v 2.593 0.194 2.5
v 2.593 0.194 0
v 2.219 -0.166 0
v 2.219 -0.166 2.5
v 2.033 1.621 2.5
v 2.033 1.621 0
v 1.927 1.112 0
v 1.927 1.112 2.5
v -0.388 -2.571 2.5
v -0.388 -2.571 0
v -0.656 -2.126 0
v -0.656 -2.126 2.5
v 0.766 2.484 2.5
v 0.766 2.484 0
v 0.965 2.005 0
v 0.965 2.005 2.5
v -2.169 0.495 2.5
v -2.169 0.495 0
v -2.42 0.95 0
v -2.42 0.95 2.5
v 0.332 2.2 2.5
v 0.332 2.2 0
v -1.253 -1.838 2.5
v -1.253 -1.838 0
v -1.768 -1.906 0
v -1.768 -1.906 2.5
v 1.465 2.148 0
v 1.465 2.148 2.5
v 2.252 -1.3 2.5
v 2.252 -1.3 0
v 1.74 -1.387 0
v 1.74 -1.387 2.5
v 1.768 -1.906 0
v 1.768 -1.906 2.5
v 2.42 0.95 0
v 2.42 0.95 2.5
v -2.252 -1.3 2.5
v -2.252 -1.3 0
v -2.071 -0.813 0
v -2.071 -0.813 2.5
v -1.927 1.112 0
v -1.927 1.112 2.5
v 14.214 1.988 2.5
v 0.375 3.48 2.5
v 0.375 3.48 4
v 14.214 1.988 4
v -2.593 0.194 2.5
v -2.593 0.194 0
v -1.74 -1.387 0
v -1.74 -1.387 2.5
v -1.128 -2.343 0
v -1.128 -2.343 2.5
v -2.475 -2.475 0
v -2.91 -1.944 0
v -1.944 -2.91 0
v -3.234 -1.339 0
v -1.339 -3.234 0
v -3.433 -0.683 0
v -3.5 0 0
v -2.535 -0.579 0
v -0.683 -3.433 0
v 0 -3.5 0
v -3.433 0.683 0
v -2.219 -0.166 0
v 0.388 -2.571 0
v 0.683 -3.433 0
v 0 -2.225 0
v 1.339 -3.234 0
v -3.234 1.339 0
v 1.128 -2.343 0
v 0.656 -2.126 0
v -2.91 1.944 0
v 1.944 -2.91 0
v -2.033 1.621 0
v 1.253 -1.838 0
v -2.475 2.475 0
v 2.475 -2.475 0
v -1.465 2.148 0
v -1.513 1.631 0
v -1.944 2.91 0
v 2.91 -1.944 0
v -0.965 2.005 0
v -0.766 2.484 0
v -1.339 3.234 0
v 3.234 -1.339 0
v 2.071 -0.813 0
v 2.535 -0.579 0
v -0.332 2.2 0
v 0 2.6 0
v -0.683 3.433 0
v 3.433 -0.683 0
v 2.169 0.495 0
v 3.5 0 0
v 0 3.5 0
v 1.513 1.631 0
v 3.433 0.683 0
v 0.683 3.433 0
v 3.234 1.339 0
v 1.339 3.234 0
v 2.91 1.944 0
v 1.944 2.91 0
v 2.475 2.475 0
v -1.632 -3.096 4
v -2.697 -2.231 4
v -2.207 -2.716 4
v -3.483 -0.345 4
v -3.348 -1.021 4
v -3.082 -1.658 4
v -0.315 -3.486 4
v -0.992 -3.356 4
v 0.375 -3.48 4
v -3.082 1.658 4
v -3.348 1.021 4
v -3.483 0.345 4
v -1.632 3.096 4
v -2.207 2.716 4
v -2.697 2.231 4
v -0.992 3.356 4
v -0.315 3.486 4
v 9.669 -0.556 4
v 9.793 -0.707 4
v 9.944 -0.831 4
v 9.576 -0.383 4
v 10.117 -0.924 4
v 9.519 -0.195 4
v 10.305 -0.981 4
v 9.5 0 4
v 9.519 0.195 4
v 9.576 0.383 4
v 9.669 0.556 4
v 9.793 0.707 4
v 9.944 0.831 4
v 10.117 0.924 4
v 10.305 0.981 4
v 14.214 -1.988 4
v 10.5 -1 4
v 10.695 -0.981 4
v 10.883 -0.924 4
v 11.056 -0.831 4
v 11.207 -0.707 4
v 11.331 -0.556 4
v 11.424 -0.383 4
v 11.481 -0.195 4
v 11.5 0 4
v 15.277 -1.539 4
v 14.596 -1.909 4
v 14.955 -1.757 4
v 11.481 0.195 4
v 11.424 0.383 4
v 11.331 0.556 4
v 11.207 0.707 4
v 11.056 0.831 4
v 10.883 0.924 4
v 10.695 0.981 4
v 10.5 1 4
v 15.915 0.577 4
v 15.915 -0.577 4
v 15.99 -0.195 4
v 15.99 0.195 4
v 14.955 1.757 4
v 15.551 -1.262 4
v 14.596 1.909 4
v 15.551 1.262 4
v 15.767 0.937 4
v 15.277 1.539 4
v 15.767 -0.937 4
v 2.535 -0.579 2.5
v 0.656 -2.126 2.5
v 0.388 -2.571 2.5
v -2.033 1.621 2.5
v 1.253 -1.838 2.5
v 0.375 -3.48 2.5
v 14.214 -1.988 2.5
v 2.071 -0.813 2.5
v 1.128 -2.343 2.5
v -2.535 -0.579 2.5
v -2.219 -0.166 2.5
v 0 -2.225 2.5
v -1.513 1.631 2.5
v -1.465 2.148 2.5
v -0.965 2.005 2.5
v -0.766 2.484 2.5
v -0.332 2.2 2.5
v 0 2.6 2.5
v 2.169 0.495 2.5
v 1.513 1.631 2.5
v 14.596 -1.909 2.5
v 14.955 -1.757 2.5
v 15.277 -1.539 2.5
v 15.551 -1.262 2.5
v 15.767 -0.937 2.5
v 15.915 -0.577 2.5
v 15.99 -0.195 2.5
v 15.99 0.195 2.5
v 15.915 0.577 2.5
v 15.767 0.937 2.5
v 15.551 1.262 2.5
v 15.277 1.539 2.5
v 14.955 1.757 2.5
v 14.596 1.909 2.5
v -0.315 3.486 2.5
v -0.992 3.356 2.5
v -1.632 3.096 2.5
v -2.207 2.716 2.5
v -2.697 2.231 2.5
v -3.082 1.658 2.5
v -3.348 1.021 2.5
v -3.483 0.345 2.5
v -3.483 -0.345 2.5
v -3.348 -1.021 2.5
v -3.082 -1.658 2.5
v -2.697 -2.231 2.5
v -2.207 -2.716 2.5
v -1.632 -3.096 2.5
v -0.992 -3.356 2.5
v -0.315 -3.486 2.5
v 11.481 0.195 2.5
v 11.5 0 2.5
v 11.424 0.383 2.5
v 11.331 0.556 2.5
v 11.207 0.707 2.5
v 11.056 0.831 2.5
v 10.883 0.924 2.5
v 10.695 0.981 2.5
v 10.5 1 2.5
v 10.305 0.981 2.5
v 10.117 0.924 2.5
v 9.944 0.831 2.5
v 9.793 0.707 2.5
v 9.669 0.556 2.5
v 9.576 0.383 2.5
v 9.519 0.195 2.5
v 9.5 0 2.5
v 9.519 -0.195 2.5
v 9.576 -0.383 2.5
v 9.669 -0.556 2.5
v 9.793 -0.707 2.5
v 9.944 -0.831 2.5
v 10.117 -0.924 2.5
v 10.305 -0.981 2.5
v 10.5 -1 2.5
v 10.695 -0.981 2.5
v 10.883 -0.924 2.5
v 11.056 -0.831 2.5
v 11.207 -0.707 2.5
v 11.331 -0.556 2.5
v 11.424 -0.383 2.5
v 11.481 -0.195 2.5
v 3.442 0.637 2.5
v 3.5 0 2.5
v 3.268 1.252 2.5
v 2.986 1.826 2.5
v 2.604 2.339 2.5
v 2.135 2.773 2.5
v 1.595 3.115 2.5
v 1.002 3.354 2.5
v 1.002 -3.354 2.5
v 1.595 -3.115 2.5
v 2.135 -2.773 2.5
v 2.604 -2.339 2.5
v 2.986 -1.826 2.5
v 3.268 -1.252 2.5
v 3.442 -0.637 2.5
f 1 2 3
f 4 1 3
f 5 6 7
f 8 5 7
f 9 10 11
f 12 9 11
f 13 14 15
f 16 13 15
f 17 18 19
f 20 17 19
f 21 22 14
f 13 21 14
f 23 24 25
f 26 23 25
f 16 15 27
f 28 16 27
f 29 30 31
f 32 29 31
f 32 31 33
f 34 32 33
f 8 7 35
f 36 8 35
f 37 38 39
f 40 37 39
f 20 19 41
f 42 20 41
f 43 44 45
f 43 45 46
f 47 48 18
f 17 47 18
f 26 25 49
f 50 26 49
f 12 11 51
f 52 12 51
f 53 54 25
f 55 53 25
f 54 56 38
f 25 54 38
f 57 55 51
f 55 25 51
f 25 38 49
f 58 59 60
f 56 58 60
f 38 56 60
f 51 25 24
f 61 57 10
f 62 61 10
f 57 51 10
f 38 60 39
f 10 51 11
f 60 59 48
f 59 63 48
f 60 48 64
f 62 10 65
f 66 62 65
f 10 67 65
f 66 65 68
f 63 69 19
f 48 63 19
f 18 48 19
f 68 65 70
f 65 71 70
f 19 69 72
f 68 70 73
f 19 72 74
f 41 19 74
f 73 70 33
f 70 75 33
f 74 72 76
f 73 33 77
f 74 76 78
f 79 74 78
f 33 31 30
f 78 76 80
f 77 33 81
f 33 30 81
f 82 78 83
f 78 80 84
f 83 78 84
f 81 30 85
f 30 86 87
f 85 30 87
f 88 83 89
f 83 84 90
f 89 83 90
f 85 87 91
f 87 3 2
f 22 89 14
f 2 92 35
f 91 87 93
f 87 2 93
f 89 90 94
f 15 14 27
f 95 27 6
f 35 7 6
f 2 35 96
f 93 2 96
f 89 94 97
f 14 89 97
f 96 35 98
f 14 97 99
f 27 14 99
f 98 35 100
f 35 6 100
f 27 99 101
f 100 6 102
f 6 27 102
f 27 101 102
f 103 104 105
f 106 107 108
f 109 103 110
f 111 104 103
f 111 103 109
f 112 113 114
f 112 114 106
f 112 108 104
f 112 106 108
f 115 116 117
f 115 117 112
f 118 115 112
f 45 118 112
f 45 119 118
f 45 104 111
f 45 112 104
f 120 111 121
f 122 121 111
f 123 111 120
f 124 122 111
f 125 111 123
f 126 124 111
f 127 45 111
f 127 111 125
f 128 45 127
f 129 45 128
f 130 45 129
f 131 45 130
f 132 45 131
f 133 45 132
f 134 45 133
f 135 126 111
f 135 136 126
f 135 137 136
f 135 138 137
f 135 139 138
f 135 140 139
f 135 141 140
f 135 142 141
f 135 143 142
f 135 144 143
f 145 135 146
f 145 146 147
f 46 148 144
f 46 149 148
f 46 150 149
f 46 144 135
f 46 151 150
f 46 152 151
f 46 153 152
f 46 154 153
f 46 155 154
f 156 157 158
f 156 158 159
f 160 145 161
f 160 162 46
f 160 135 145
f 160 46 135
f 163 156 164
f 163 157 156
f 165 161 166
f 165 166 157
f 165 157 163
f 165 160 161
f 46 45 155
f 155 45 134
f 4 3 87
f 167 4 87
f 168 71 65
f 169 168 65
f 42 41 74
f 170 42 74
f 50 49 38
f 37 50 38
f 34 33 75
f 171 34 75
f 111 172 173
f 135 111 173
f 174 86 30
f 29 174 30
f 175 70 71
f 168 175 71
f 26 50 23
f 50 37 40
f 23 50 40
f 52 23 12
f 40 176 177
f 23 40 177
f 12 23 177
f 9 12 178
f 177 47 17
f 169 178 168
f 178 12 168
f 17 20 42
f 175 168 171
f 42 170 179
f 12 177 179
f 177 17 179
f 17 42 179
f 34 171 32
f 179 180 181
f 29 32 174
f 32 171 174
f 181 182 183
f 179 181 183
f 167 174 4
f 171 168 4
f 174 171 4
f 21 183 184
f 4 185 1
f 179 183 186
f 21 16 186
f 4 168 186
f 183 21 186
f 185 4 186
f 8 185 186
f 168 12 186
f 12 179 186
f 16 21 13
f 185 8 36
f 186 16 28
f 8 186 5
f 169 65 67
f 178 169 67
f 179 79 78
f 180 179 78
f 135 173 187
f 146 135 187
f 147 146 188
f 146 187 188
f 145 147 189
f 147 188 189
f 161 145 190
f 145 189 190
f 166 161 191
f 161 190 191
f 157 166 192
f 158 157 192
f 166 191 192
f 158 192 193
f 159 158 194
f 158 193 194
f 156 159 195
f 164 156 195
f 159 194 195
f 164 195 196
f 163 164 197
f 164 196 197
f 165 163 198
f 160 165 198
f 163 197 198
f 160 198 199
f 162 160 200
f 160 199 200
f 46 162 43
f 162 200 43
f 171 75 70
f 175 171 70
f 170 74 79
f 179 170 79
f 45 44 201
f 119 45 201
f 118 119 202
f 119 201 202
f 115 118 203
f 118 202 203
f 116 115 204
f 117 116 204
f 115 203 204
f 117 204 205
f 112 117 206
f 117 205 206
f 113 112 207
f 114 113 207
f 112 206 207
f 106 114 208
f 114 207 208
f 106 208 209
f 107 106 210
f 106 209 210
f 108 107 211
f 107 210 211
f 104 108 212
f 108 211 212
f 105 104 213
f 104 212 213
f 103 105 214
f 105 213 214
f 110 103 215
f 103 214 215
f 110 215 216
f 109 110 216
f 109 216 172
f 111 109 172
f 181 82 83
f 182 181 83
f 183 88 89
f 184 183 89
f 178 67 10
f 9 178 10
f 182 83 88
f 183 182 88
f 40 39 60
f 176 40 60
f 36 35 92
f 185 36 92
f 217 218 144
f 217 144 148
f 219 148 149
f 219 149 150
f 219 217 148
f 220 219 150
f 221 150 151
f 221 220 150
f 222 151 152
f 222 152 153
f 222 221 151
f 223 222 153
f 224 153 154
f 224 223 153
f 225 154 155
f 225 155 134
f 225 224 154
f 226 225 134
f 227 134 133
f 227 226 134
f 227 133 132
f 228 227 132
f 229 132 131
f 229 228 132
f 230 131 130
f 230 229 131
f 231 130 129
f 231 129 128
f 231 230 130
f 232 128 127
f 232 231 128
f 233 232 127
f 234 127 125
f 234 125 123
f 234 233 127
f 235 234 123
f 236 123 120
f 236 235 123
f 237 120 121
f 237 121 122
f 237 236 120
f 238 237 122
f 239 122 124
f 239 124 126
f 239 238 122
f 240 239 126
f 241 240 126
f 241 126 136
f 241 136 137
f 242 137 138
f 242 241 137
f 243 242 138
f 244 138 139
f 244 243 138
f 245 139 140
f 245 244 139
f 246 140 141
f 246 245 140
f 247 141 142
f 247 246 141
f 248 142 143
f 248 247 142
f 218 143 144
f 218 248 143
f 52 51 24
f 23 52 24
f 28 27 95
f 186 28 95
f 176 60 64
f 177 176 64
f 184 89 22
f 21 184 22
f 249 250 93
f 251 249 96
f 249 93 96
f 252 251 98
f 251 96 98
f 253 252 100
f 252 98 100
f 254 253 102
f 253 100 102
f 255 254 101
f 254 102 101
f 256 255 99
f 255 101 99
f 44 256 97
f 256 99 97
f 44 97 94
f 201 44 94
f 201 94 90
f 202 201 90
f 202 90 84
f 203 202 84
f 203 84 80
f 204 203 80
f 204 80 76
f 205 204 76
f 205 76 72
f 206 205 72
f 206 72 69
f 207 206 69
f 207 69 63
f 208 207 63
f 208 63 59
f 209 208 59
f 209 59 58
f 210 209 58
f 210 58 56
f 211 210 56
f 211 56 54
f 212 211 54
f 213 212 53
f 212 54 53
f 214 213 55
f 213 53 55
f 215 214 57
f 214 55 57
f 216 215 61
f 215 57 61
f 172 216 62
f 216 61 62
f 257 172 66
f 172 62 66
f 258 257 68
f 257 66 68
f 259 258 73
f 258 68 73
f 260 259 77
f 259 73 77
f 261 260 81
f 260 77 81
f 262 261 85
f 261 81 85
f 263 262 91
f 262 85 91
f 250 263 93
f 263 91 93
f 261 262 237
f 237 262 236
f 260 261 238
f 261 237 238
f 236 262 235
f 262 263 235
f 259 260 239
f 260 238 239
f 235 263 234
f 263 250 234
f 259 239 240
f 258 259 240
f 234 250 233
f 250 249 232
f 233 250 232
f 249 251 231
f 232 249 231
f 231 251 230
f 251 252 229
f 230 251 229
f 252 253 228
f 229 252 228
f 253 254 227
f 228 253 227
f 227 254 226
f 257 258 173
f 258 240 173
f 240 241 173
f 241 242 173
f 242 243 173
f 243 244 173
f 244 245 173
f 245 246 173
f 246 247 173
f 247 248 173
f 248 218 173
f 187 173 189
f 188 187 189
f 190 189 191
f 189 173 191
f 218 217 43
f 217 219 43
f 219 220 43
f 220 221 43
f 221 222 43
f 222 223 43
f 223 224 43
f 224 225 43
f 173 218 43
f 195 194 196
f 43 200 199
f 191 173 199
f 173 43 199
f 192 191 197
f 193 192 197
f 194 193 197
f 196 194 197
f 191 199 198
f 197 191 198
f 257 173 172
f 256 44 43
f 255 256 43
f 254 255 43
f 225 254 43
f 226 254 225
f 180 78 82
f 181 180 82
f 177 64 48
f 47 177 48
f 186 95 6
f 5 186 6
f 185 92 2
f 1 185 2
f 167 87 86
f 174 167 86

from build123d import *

# Parameters (mm, degrees)
SKETCH_R     = 3.5
PAD_DEPTH    = 2.5
SKETCH001_R  = 1
PAD001_DEPTH = 1.5


with BuildPart() as part:
    # Sketch → Pad (new body)
    with BuildSketch(Plane.XY):
        Circle(SKETCH_R)
        Polygon((0.331619, 2.200149), (0.766363, 2.484489), (0.965391, 2.004656), (1.464632, 2.148221), (1.513384, 1.63104), (2.032762, 1.621073), (1.926907, 1.1125), (2.420272, 0.949887), (2.169215, 0.495109), (2.59273, 0.194298), (2.218778, -0.166274), (2.534813, -0.578554), (2.071194, -0.812884), (2.251666, -1.3), (1.739575, -1.387265), (1.768449, -1.905935), (1.253387, -1.838381), (1.128098, -2.342519), (0.65583, -2.126149), (0.38751, -2.57096), (0, -2.225), (-0.38751, -2.57096), (-0.65583, -2.126149), (-1.128098, -2.342519), (-1.253387, -1.838381), (-1.768449, -1.905935), (-1.739575, -1.387265), (-2.251666, -1.3), (-2.071194, -0.812884), (-2.534813, -0.578554), (-2.218778, -0.166274), (-2.59273, 0.194298), (-2.169215, 0.495109), (-2.420272, 0.949887), (-1.926907, 1.1125), (-2.032762, 1.621073), (-1.513384, 1.63104), (-1.464632, 2.148221), (-0.965391, 2.004656), (-0.766363, 2.484489), (-0.331619, 2.200149), (0, 2.6), align=None, mode=Mode.SUBTRACT)
    extrude(amount=PAD_DEPTH)

    # Sketch001 (on Face45 of Pad) → Pad001 (join)
    with BuildSketch(Plane.XY.offset(2.5)):
        with BuildLine():
            ThreePointArc((0.375, 3.479853), (-3.5, 0), (0.375, -3.479853))
            Line((0.375, -3.479853), (14.214286, -1.988487))
            ThreePointArc((14.214286, -1.988487), (16, 0), (14.214286, 1.988487))
            Line((0.375, 3.479853), (14.214286, 1.988487))
        make_face()
        with Locations((10.5, 0)):
            Circle(SKETCH001_R, mode=Mode.SUBTRACT)
    extrude(amount=PAD001_DEPTH)


solid = part.part
